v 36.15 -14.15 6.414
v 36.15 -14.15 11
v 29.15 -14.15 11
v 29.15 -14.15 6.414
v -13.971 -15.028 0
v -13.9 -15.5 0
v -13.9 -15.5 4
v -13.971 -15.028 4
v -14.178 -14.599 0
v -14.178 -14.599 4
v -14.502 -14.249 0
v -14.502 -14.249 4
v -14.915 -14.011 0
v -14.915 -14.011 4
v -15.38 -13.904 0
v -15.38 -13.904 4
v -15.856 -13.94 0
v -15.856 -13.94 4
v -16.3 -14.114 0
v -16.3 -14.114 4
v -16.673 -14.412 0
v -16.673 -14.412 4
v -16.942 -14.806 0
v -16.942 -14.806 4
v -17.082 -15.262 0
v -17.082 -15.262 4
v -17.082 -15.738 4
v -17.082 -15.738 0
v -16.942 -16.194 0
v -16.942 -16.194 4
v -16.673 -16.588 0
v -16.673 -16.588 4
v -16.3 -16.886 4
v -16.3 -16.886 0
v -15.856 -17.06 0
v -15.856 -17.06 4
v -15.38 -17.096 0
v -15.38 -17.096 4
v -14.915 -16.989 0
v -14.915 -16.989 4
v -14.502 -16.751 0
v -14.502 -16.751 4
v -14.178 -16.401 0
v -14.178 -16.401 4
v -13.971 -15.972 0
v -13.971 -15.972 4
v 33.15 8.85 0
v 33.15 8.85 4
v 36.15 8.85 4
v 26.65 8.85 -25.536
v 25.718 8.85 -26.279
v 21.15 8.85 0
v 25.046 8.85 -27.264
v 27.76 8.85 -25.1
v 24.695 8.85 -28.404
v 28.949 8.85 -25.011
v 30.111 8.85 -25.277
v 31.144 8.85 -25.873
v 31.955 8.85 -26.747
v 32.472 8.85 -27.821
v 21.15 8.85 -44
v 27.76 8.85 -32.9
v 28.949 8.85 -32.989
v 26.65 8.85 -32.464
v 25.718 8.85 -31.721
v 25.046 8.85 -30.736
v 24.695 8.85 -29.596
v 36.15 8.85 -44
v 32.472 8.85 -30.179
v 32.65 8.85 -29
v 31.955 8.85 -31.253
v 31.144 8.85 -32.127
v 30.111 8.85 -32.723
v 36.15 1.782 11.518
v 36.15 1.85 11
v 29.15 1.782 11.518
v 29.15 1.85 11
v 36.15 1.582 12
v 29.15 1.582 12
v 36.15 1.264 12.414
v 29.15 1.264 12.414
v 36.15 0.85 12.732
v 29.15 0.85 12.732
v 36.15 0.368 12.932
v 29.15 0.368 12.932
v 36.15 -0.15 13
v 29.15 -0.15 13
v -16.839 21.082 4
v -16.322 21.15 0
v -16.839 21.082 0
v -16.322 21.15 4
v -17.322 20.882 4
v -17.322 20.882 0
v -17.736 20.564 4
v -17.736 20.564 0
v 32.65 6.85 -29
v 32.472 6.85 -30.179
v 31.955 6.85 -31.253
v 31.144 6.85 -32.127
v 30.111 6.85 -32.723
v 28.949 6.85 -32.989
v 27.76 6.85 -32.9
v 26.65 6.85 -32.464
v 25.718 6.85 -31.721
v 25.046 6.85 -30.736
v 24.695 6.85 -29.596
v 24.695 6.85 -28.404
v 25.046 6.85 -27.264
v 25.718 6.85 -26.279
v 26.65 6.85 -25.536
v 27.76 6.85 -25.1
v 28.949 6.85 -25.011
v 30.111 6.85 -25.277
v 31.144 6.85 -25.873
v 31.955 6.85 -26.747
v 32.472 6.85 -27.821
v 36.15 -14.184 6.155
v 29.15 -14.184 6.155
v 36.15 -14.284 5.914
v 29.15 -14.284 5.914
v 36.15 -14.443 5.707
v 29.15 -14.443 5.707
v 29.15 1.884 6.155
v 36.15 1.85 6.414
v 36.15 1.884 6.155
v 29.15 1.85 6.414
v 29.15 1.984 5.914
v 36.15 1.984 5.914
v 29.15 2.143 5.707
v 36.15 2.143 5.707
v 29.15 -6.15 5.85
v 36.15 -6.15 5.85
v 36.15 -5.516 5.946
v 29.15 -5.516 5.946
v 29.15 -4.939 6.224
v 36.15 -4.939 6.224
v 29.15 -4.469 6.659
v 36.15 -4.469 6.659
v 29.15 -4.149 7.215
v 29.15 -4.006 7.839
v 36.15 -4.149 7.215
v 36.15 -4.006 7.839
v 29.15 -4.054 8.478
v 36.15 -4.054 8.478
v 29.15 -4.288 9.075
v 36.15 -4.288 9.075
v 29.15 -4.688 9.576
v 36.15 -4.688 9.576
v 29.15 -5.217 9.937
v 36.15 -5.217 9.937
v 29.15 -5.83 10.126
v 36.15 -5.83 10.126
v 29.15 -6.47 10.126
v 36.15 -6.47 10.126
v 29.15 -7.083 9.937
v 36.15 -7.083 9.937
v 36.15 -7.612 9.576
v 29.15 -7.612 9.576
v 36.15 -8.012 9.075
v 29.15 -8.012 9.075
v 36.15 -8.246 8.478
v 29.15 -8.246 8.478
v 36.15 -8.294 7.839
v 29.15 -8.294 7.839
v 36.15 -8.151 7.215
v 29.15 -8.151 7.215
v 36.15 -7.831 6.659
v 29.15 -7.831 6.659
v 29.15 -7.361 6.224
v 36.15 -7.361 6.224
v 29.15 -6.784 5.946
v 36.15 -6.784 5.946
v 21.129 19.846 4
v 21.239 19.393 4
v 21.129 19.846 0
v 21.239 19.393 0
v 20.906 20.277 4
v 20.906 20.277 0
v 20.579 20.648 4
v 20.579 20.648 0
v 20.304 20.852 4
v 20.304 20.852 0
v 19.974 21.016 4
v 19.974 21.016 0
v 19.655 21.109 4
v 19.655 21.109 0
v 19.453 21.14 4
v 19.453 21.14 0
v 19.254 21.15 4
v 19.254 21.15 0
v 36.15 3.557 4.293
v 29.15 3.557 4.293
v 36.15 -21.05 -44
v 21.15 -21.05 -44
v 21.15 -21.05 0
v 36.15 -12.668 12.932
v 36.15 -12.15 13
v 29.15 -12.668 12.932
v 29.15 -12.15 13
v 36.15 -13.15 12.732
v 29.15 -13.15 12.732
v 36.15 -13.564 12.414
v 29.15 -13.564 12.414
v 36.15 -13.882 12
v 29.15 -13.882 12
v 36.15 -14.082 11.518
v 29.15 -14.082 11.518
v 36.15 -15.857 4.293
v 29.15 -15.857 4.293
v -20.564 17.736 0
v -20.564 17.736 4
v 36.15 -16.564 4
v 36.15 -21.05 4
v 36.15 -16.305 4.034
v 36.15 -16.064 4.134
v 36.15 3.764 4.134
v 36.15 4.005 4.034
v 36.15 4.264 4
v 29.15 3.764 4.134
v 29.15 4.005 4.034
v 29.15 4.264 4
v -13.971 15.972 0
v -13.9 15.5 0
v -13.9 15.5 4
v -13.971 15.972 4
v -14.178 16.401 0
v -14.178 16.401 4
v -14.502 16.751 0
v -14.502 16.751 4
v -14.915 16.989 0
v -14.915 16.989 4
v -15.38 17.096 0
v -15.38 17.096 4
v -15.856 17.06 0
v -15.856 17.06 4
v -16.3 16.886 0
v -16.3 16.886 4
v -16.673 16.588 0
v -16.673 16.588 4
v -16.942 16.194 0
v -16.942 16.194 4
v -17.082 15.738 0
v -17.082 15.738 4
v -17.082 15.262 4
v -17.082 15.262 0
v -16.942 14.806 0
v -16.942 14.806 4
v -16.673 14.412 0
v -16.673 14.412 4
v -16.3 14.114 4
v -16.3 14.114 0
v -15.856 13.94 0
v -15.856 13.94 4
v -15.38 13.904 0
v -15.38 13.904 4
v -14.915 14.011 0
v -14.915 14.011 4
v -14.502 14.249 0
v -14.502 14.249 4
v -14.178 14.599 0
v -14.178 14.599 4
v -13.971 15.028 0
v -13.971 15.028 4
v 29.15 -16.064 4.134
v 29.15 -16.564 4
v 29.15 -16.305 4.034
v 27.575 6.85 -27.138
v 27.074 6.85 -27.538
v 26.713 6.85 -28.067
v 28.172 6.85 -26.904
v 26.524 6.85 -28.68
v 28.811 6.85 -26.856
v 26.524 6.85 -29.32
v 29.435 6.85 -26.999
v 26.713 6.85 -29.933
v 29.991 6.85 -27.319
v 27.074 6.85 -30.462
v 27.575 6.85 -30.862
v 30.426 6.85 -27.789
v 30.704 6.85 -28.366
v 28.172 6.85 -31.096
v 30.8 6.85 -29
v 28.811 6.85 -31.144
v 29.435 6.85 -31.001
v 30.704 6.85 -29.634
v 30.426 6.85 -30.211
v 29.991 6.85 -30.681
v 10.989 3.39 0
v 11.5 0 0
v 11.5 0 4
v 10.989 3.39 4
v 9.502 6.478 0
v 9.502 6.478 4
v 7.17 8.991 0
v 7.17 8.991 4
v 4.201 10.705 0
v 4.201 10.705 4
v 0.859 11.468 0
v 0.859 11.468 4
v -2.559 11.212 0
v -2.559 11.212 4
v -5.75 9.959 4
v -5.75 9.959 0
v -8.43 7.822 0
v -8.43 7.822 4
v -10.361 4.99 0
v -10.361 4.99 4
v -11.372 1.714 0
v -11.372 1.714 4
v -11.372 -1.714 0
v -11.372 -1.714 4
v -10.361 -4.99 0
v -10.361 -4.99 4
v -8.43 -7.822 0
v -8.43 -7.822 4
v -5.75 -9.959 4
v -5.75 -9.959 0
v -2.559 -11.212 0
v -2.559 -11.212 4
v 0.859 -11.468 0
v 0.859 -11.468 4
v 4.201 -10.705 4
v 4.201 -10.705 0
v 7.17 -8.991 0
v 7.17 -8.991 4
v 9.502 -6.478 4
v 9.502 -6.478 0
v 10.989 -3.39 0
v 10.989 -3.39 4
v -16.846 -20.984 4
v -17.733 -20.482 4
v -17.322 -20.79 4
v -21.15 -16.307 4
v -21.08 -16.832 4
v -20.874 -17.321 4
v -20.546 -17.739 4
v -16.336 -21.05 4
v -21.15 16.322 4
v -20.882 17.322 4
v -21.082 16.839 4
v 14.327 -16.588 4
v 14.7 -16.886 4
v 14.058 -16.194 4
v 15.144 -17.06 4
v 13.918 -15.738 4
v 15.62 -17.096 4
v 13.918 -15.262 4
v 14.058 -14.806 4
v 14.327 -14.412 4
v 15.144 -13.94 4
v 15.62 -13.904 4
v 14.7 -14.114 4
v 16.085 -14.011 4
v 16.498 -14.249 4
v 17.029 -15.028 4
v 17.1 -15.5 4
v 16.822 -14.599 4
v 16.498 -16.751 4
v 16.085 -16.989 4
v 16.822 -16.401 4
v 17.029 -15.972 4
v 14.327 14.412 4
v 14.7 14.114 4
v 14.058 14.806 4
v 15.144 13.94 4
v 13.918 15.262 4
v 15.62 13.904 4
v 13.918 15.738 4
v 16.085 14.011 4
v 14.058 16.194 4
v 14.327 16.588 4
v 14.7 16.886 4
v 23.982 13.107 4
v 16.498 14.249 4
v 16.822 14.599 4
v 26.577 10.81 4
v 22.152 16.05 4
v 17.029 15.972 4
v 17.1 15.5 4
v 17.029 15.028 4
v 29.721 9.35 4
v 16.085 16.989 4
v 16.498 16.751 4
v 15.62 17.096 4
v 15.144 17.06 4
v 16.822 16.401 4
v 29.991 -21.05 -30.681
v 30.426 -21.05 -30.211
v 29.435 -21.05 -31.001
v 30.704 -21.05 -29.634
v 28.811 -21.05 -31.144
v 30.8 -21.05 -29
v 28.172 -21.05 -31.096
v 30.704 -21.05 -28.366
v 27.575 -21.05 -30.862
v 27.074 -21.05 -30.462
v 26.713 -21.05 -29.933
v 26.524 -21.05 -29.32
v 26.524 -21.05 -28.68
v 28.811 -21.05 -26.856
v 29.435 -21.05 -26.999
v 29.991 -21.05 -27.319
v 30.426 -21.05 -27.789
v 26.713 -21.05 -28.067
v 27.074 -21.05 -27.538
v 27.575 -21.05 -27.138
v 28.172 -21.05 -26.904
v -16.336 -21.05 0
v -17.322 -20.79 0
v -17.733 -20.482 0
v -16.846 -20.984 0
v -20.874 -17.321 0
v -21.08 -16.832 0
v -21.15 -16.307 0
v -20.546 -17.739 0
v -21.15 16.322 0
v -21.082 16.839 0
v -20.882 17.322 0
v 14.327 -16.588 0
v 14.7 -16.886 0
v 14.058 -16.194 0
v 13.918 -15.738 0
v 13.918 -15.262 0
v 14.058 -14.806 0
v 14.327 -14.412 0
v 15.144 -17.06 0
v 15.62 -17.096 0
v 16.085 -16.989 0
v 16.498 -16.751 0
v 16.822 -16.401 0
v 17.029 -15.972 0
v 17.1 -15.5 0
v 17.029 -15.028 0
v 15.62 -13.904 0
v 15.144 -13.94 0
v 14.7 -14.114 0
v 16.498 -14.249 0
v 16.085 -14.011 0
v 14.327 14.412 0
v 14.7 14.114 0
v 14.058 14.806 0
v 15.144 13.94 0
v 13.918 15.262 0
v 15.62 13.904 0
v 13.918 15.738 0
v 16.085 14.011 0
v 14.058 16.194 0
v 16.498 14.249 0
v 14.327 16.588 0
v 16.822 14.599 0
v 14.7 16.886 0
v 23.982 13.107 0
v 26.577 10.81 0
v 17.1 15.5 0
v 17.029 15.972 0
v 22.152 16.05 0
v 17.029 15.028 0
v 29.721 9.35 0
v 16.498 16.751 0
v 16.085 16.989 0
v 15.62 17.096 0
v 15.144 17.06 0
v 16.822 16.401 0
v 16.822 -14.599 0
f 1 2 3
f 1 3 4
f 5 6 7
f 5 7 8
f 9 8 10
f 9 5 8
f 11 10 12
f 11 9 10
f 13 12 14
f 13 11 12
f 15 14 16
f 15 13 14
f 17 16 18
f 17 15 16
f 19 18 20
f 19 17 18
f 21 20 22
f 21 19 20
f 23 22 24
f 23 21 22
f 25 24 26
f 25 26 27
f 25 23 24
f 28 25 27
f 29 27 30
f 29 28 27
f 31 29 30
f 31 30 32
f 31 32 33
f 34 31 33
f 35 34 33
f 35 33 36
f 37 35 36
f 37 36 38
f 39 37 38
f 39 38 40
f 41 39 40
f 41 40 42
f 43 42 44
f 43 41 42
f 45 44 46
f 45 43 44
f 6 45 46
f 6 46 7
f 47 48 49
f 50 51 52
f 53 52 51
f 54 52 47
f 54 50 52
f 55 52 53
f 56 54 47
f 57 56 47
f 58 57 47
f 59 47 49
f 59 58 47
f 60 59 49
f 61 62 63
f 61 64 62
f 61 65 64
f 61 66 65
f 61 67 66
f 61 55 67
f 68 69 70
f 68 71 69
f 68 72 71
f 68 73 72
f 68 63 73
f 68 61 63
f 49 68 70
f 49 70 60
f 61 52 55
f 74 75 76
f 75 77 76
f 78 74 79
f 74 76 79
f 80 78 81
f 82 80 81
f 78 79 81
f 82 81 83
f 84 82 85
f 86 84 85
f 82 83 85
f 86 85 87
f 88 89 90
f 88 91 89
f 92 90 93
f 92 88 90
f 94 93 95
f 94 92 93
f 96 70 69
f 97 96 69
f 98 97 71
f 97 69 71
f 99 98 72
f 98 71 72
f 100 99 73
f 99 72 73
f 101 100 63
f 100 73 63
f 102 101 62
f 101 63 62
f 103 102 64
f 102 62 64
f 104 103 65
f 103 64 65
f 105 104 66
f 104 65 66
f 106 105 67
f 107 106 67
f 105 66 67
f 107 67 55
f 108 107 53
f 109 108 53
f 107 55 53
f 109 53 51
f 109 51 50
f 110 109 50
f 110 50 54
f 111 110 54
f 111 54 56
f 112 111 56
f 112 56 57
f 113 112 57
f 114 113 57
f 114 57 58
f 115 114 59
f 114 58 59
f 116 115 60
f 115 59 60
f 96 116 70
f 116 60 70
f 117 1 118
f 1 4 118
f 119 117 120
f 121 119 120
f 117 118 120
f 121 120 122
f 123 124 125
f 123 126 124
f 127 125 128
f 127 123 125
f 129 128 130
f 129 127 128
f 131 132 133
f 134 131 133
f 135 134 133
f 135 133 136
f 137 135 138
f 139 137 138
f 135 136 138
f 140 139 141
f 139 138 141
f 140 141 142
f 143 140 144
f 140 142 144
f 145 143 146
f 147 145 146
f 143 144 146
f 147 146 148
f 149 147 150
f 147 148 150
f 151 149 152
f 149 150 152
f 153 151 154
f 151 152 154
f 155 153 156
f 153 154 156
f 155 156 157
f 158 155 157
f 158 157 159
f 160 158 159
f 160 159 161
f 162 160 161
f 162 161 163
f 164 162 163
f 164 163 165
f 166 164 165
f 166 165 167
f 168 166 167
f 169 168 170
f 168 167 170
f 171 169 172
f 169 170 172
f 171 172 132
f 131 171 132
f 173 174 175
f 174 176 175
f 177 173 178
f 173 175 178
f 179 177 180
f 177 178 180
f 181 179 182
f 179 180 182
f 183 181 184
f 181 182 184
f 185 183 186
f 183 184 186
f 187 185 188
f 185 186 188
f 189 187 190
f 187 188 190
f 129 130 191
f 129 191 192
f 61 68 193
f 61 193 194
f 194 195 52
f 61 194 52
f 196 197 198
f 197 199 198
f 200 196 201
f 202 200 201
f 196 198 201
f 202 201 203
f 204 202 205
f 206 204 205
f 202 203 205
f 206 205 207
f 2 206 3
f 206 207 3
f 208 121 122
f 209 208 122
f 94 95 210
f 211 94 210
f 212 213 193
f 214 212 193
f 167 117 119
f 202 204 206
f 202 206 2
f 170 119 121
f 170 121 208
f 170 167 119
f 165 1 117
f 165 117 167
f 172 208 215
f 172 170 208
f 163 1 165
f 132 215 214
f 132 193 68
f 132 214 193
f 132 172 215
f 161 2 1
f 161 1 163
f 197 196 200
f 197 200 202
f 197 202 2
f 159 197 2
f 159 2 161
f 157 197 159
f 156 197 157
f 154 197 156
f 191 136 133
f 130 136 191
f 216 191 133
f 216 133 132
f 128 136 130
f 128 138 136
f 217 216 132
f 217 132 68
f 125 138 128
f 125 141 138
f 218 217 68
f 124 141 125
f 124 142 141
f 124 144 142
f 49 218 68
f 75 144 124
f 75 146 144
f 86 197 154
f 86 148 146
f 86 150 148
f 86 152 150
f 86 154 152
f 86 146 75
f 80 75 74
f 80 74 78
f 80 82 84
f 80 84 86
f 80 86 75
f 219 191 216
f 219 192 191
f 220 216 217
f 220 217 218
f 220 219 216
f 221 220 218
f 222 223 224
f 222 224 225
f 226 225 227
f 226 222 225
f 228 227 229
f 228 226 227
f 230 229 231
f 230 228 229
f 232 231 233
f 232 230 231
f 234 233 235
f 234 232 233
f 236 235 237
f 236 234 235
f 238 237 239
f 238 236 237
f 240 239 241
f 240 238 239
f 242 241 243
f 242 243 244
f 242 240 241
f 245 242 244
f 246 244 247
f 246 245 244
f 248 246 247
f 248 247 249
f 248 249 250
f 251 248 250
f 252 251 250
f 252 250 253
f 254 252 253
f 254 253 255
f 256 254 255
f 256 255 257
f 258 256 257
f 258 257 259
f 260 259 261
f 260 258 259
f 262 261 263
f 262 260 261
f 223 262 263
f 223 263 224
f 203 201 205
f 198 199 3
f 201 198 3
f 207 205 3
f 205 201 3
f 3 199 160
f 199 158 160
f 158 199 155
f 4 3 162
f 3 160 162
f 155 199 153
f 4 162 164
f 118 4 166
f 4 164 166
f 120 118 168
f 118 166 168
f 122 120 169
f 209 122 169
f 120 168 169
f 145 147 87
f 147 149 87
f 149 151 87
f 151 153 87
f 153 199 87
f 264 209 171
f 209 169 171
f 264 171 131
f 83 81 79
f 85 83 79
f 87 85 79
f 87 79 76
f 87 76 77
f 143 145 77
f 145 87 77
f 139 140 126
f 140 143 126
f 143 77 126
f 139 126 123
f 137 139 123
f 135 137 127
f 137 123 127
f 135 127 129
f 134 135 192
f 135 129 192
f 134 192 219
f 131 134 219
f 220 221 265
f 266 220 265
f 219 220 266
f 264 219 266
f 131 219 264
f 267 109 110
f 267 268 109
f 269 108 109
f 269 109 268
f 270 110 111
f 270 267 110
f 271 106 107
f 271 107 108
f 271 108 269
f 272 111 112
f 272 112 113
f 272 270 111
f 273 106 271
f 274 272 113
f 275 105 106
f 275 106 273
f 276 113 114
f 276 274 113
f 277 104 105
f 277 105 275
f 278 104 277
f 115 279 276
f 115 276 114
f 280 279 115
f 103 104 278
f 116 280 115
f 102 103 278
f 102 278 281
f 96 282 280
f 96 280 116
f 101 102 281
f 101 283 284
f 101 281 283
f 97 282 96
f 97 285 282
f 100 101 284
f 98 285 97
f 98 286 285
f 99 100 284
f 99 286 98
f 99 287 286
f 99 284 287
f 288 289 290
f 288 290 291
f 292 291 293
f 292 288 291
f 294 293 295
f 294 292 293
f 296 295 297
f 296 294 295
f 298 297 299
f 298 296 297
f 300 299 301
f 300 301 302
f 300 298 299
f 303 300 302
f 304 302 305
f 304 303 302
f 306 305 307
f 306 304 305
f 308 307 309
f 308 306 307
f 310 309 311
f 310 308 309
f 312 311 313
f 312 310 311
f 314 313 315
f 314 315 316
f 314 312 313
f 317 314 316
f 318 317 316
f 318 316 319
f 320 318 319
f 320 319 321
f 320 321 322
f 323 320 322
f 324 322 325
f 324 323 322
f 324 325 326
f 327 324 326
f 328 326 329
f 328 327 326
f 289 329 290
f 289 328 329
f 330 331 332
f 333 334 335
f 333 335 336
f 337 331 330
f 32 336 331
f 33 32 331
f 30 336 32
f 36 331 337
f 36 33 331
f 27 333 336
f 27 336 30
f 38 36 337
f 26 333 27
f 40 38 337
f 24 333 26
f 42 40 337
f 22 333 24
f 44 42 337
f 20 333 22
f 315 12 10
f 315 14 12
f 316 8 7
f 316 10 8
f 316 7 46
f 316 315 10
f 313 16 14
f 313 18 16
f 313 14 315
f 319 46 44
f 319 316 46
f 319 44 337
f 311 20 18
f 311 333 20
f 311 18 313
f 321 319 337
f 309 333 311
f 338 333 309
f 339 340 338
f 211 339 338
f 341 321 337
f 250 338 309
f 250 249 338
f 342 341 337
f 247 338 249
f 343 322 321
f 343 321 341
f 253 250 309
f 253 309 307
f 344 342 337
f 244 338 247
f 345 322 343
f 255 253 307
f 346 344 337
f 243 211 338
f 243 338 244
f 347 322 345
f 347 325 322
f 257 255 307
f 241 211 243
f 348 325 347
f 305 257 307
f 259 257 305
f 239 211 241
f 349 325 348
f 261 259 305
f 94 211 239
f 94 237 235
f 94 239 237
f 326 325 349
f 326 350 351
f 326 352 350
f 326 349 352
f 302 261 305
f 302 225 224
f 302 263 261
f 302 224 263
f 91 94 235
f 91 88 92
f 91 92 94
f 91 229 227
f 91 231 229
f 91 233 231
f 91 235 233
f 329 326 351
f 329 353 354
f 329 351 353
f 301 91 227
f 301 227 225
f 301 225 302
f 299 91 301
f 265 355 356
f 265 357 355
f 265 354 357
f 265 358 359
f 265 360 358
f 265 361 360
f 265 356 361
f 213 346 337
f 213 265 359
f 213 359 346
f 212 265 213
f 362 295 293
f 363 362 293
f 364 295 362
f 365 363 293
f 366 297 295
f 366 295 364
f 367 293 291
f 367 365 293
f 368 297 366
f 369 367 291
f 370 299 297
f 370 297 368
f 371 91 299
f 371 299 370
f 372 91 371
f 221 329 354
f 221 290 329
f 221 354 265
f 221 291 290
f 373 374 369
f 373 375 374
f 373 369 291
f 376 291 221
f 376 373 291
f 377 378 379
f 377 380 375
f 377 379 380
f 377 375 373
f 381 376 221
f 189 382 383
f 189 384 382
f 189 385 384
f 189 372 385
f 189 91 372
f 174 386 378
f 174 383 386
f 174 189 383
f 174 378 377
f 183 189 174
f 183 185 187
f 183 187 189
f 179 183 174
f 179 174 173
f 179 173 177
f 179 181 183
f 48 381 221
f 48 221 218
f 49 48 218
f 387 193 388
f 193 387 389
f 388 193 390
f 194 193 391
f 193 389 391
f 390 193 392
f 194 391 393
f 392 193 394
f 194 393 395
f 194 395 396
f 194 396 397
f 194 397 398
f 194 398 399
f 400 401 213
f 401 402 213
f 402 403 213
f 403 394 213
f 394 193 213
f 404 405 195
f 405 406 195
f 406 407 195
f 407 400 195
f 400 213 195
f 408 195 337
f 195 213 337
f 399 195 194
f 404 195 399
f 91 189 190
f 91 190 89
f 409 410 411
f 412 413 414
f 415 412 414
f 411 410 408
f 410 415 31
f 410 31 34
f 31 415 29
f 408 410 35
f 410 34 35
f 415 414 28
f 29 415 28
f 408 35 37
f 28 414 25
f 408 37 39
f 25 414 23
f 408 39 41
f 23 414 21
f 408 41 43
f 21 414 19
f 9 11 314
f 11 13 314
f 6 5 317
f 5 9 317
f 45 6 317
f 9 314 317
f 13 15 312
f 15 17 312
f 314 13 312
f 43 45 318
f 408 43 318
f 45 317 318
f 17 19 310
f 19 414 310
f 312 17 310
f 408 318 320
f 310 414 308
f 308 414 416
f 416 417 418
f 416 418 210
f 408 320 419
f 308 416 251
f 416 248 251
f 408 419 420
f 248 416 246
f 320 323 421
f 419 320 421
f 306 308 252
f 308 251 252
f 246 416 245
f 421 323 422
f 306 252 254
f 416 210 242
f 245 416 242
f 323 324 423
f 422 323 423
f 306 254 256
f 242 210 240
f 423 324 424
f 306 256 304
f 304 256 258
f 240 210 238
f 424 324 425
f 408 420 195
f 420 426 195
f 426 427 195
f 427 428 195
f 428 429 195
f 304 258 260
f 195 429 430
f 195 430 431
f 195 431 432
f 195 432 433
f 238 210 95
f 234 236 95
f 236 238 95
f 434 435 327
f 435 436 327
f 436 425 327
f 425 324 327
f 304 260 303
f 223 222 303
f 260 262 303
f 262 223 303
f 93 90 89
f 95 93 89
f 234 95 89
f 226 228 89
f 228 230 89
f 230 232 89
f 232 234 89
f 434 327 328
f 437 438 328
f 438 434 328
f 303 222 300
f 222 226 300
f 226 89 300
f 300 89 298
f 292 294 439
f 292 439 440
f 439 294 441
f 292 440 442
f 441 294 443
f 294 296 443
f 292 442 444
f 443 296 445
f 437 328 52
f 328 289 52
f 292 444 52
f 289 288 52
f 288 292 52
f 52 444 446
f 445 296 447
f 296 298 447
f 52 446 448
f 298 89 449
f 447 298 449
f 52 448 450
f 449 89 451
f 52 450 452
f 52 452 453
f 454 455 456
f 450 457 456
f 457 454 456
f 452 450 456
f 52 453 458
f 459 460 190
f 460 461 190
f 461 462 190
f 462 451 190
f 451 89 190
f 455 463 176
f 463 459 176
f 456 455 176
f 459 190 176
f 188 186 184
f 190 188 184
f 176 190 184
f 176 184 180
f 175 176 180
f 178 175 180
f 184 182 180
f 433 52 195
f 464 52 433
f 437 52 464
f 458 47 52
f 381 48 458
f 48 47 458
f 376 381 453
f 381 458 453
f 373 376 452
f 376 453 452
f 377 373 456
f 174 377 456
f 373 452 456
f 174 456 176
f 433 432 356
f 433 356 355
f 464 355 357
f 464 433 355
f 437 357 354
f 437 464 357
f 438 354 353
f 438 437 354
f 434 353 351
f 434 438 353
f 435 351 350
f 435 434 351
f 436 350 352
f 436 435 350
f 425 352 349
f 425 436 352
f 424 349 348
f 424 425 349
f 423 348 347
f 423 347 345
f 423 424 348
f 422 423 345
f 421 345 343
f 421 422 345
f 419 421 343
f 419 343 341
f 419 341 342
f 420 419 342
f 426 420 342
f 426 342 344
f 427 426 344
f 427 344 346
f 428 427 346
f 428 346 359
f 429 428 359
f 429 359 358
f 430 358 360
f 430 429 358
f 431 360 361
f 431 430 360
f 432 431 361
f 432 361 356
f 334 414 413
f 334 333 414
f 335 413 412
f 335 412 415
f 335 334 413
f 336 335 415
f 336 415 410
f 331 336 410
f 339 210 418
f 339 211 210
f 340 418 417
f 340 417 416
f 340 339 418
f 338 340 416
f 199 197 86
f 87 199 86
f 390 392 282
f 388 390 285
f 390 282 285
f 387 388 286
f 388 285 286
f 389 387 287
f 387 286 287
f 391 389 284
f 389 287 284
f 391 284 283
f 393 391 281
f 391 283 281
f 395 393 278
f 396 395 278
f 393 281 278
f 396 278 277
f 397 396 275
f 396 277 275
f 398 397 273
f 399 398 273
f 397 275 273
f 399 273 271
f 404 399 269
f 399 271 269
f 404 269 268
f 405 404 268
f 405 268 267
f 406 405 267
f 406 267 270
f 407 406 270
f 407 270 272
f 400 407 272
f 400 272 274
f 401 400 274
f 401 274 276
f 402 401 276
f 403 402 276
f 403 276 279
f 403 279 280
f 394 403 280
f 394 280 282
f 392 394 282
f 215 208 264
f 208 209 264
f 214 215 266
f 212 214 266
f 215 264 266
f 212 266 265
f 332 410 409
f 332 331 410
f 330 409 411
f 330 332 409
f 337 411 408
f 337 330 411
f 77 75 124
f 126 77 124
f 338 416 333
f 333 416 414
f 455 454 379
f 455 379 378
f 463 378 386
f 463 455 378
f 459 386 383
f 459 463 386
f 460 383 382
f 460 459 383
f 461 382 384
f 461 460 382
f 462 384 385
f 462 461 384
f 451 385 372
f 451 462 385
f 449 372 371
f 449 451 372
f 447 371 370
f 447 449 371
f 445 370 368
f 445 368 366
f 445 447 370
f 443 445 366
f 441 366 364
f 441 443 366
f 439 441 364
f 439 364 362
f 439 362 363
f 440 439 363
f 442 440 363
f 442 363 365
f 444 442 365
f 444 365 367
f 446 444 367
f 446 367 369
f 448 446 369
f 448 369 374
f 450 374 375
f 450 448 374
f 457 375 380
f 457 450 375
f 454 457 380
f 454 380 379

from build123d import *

# Parameters (mm, degrees)
CROQUIS1_R              = 1.6
CROQUIS1_R_2            = 11.5
SALIENTE_EXTRUIR1_DEPTH = 4
CROQUIS2_W              = 9
CROQUIS2_H              = 16
CROQUIS2_R              = 2.15
SALIENTE_EXTRUIR2_DEPTH = 7
CROQUIS3_W              = 15
CROQUIS3_H              = 42.2
SALIENTE_EXTRUIR3_DEPTH = 44
CORTAR_EXTRUIR1_START   = -12.3
CROQUIS4_W              = 15
CROQUIS4_H              = 48
CORTAR_EXTRUIR1_DEPTH   = 12.3
REDONDEO1_R             = 12
REDONDEO2_R             = 2
REDONDEO3_R             = 2
CHAFL_N1_SIZE           = 2
CHAFL_N2_SIZE           = 2
REDONDEO4_R             = 2
REDONDEO5_R             = 1
CROQUIS5_R              = 2.15
CORTAR_EXTRUIR2_DEPTH   = 30.9000001
CROQUIS5_3_R            = 4
CROQUIS5_3_R_2          = 2.15
CORTAR_EXTRUIR3_DEPTH   = 2


with BuildPart() as part:
    # Croquis1 → Saliente-Extruir1 (new body)
    with BuildSketch(Plane.XY):
        Polygon((21.15, 21.15), (17.15, 21.15), (-17.15, 21.15), (-21.15, 17.15), (-21.15, -17.15), (-17.15, -21.05), (17.15, -21.05), (36.15, -21.05), (36.15, 21.15), align=None)
        with Locations((-15.5, 15.5)):
            Circle(CROQUIS1_R, mode=Mode.SUBTRACT)
        with Locations((-15.5, -15.5)):
            Circle(CROQUIS1_R, mode=Mode.SUBTRACT)
        with Locations((15.5, 15.5)):
            Circle(CROQUIS1_R, mode=Mode.SUBTRACT)
        with Locations((15.5, -15.5)):
            Circle(CROQUIS1_R, mode=Mode.SUBTRACT)
        Circle(CROQUIS1_R_2, mode=Mode.SUBTRACT)
    extrude(amount=SALIENTE_EXTRUIR1_DEPTH)

    # Croquis2 → Saliente-Extruir2 (add)
    with BuildSketch(Plane(origin=(36.15, 0, 0), x_dir=(0, 0, -1), z_dir=(1, 0, 0))):
        with Locations((-8.5, -6.15)):
            Rectangle(CROQUIS2_W, CROQUIS2_H)
        with Locations((-8, -6.15)):
            Circle(CROQUIS2_R, mode=Mode.SUBTRACT)
    extrude(amount=-SALIENTE_EXTRUIR2_DEPTH)

    # Croquis3 → Saliente-Extruir3 (add)
    with BuildSketch(Plane(origin=(0, 0, 0), x_dir=(-1, 0, 0), z_dir=(0, 0, -1))):
        with Locations((-28.65, 0.05)):
            Rectangle(CROQUIS3_W, CROQUIS3_H)
    extrude(amount=SALIENTE_EXTRUIR3_DEPTH)

    # Croquis4 → Cortar-Extruir1 (cut)
    with BuildSketch(Plane(origin=(0, 21.15, 0), x_dir=(1, 0, 0), z_dir=(0, 1, 0)).offset(CORTAR_EXTRUIR1_START)):
        with Locations((28.65, 20)):
            Rectangle(CROQUIS4_W, CROQUIS4_H)
    extrude(amount=CORTAR_EXTRUIR1_DEPTH, mode=Mode.SUBTRACT)

    # Redondeo1
    redondeo1_edges = [part.edges().sort_by_distance(p)[0] for p in [
        (21.15, 8.85, 2),
    ]]
    fillet(redondeo1_edges, radius=REDONDEO1_R)

    # Redondeo2
    redondeo2_edges = [part.edges().sort_by_distance(p)[0] for p in [
        (21.15, 21.15, 2),
    ]]
    fillet(redondeo2_edges, radius=REDONDEO2_R)

    # Redondeo3
    redondeo3_edges = [part.edges().sort_by_distance(p)[0] for p in [
        (-17.15, -21.05, 2),
        (-21.15, -17.15, 2),
        (-21.15, 17.15, 2),
        (-17.15, 21.15, 2),
    ]]
    fillet(redondeo3_edges, radius=REDONDEO3_R)

    # Chaflán1
    chafl_n1_edges = [part.edges().sort_by_distance(p)[0] for p in [
        (32.65, 1.85, 4),
    ]]
    chamfer(chafl_n1_edges, length=CHAFL_N1_SIZE)

    # Chaflán2
    chafl_n2_edges = [part.edges().sort_by_distance(p)[0] for p in [
        (32.65, -14.15, 4),
    ]]
    chamfer(chafl_n2_edges, length=CHAFL_N2_SIZE)

    # Redondeo4
    redondeo4_edges = [part.edges().sort_by_distance(p)[0] for p in [
        (32.65, 1.85, 13),
        (32.65, -14.15, 13),
    ]]
    fillet(redondeo4_edges, radius=REDONDEO4_R)

    # Redondeo5
    redondeo5_edges = [part.edges().sort_by_distance(p)[0] for p in [
        (32.65, 3.85, 4),
        (32.65, 1.85, 6),
        (32.65, -14.15, 6),
        (32.65, -16.15, 4),
    ]]
    fillet(redondeo5_edges, radius=REDONDEO5_R)

    # Croquis5 → Cortar-Extruir2 (cut, through all)
    with BuildSketch(Plane(origin=(0, 8.85, 0), x_dir=(1, 0, 0), z_dir=(0, 1, 0))):
        with Locations((28.65, 29)):
            Circle(CROQUIS5_R)
    extrude(amount=-CORTAR_EXTRUIR2_DEPTH, mode=Mode.SUBTRACT)

    # Croquis5<3> → Cortar-Extruir3 (cut)
    with BuildSketch(Plane(origin=(0, 8.85, 0), x_dir=(1, 0, 0), z_dir=(0, 1, 0))):
        with Locations((28.65, 29)):
            Circle(CROQUIS5_3_R)
        with Locations((28.65, 29)):
            Circle(CROQUIS5_3_R_2, mode=Mode.SUBTRACT)
    extrude(amount=-CORTAR_EXTRUIR3_DEPTH, mode=Mode.SUBTRACT)


solid = part.part
